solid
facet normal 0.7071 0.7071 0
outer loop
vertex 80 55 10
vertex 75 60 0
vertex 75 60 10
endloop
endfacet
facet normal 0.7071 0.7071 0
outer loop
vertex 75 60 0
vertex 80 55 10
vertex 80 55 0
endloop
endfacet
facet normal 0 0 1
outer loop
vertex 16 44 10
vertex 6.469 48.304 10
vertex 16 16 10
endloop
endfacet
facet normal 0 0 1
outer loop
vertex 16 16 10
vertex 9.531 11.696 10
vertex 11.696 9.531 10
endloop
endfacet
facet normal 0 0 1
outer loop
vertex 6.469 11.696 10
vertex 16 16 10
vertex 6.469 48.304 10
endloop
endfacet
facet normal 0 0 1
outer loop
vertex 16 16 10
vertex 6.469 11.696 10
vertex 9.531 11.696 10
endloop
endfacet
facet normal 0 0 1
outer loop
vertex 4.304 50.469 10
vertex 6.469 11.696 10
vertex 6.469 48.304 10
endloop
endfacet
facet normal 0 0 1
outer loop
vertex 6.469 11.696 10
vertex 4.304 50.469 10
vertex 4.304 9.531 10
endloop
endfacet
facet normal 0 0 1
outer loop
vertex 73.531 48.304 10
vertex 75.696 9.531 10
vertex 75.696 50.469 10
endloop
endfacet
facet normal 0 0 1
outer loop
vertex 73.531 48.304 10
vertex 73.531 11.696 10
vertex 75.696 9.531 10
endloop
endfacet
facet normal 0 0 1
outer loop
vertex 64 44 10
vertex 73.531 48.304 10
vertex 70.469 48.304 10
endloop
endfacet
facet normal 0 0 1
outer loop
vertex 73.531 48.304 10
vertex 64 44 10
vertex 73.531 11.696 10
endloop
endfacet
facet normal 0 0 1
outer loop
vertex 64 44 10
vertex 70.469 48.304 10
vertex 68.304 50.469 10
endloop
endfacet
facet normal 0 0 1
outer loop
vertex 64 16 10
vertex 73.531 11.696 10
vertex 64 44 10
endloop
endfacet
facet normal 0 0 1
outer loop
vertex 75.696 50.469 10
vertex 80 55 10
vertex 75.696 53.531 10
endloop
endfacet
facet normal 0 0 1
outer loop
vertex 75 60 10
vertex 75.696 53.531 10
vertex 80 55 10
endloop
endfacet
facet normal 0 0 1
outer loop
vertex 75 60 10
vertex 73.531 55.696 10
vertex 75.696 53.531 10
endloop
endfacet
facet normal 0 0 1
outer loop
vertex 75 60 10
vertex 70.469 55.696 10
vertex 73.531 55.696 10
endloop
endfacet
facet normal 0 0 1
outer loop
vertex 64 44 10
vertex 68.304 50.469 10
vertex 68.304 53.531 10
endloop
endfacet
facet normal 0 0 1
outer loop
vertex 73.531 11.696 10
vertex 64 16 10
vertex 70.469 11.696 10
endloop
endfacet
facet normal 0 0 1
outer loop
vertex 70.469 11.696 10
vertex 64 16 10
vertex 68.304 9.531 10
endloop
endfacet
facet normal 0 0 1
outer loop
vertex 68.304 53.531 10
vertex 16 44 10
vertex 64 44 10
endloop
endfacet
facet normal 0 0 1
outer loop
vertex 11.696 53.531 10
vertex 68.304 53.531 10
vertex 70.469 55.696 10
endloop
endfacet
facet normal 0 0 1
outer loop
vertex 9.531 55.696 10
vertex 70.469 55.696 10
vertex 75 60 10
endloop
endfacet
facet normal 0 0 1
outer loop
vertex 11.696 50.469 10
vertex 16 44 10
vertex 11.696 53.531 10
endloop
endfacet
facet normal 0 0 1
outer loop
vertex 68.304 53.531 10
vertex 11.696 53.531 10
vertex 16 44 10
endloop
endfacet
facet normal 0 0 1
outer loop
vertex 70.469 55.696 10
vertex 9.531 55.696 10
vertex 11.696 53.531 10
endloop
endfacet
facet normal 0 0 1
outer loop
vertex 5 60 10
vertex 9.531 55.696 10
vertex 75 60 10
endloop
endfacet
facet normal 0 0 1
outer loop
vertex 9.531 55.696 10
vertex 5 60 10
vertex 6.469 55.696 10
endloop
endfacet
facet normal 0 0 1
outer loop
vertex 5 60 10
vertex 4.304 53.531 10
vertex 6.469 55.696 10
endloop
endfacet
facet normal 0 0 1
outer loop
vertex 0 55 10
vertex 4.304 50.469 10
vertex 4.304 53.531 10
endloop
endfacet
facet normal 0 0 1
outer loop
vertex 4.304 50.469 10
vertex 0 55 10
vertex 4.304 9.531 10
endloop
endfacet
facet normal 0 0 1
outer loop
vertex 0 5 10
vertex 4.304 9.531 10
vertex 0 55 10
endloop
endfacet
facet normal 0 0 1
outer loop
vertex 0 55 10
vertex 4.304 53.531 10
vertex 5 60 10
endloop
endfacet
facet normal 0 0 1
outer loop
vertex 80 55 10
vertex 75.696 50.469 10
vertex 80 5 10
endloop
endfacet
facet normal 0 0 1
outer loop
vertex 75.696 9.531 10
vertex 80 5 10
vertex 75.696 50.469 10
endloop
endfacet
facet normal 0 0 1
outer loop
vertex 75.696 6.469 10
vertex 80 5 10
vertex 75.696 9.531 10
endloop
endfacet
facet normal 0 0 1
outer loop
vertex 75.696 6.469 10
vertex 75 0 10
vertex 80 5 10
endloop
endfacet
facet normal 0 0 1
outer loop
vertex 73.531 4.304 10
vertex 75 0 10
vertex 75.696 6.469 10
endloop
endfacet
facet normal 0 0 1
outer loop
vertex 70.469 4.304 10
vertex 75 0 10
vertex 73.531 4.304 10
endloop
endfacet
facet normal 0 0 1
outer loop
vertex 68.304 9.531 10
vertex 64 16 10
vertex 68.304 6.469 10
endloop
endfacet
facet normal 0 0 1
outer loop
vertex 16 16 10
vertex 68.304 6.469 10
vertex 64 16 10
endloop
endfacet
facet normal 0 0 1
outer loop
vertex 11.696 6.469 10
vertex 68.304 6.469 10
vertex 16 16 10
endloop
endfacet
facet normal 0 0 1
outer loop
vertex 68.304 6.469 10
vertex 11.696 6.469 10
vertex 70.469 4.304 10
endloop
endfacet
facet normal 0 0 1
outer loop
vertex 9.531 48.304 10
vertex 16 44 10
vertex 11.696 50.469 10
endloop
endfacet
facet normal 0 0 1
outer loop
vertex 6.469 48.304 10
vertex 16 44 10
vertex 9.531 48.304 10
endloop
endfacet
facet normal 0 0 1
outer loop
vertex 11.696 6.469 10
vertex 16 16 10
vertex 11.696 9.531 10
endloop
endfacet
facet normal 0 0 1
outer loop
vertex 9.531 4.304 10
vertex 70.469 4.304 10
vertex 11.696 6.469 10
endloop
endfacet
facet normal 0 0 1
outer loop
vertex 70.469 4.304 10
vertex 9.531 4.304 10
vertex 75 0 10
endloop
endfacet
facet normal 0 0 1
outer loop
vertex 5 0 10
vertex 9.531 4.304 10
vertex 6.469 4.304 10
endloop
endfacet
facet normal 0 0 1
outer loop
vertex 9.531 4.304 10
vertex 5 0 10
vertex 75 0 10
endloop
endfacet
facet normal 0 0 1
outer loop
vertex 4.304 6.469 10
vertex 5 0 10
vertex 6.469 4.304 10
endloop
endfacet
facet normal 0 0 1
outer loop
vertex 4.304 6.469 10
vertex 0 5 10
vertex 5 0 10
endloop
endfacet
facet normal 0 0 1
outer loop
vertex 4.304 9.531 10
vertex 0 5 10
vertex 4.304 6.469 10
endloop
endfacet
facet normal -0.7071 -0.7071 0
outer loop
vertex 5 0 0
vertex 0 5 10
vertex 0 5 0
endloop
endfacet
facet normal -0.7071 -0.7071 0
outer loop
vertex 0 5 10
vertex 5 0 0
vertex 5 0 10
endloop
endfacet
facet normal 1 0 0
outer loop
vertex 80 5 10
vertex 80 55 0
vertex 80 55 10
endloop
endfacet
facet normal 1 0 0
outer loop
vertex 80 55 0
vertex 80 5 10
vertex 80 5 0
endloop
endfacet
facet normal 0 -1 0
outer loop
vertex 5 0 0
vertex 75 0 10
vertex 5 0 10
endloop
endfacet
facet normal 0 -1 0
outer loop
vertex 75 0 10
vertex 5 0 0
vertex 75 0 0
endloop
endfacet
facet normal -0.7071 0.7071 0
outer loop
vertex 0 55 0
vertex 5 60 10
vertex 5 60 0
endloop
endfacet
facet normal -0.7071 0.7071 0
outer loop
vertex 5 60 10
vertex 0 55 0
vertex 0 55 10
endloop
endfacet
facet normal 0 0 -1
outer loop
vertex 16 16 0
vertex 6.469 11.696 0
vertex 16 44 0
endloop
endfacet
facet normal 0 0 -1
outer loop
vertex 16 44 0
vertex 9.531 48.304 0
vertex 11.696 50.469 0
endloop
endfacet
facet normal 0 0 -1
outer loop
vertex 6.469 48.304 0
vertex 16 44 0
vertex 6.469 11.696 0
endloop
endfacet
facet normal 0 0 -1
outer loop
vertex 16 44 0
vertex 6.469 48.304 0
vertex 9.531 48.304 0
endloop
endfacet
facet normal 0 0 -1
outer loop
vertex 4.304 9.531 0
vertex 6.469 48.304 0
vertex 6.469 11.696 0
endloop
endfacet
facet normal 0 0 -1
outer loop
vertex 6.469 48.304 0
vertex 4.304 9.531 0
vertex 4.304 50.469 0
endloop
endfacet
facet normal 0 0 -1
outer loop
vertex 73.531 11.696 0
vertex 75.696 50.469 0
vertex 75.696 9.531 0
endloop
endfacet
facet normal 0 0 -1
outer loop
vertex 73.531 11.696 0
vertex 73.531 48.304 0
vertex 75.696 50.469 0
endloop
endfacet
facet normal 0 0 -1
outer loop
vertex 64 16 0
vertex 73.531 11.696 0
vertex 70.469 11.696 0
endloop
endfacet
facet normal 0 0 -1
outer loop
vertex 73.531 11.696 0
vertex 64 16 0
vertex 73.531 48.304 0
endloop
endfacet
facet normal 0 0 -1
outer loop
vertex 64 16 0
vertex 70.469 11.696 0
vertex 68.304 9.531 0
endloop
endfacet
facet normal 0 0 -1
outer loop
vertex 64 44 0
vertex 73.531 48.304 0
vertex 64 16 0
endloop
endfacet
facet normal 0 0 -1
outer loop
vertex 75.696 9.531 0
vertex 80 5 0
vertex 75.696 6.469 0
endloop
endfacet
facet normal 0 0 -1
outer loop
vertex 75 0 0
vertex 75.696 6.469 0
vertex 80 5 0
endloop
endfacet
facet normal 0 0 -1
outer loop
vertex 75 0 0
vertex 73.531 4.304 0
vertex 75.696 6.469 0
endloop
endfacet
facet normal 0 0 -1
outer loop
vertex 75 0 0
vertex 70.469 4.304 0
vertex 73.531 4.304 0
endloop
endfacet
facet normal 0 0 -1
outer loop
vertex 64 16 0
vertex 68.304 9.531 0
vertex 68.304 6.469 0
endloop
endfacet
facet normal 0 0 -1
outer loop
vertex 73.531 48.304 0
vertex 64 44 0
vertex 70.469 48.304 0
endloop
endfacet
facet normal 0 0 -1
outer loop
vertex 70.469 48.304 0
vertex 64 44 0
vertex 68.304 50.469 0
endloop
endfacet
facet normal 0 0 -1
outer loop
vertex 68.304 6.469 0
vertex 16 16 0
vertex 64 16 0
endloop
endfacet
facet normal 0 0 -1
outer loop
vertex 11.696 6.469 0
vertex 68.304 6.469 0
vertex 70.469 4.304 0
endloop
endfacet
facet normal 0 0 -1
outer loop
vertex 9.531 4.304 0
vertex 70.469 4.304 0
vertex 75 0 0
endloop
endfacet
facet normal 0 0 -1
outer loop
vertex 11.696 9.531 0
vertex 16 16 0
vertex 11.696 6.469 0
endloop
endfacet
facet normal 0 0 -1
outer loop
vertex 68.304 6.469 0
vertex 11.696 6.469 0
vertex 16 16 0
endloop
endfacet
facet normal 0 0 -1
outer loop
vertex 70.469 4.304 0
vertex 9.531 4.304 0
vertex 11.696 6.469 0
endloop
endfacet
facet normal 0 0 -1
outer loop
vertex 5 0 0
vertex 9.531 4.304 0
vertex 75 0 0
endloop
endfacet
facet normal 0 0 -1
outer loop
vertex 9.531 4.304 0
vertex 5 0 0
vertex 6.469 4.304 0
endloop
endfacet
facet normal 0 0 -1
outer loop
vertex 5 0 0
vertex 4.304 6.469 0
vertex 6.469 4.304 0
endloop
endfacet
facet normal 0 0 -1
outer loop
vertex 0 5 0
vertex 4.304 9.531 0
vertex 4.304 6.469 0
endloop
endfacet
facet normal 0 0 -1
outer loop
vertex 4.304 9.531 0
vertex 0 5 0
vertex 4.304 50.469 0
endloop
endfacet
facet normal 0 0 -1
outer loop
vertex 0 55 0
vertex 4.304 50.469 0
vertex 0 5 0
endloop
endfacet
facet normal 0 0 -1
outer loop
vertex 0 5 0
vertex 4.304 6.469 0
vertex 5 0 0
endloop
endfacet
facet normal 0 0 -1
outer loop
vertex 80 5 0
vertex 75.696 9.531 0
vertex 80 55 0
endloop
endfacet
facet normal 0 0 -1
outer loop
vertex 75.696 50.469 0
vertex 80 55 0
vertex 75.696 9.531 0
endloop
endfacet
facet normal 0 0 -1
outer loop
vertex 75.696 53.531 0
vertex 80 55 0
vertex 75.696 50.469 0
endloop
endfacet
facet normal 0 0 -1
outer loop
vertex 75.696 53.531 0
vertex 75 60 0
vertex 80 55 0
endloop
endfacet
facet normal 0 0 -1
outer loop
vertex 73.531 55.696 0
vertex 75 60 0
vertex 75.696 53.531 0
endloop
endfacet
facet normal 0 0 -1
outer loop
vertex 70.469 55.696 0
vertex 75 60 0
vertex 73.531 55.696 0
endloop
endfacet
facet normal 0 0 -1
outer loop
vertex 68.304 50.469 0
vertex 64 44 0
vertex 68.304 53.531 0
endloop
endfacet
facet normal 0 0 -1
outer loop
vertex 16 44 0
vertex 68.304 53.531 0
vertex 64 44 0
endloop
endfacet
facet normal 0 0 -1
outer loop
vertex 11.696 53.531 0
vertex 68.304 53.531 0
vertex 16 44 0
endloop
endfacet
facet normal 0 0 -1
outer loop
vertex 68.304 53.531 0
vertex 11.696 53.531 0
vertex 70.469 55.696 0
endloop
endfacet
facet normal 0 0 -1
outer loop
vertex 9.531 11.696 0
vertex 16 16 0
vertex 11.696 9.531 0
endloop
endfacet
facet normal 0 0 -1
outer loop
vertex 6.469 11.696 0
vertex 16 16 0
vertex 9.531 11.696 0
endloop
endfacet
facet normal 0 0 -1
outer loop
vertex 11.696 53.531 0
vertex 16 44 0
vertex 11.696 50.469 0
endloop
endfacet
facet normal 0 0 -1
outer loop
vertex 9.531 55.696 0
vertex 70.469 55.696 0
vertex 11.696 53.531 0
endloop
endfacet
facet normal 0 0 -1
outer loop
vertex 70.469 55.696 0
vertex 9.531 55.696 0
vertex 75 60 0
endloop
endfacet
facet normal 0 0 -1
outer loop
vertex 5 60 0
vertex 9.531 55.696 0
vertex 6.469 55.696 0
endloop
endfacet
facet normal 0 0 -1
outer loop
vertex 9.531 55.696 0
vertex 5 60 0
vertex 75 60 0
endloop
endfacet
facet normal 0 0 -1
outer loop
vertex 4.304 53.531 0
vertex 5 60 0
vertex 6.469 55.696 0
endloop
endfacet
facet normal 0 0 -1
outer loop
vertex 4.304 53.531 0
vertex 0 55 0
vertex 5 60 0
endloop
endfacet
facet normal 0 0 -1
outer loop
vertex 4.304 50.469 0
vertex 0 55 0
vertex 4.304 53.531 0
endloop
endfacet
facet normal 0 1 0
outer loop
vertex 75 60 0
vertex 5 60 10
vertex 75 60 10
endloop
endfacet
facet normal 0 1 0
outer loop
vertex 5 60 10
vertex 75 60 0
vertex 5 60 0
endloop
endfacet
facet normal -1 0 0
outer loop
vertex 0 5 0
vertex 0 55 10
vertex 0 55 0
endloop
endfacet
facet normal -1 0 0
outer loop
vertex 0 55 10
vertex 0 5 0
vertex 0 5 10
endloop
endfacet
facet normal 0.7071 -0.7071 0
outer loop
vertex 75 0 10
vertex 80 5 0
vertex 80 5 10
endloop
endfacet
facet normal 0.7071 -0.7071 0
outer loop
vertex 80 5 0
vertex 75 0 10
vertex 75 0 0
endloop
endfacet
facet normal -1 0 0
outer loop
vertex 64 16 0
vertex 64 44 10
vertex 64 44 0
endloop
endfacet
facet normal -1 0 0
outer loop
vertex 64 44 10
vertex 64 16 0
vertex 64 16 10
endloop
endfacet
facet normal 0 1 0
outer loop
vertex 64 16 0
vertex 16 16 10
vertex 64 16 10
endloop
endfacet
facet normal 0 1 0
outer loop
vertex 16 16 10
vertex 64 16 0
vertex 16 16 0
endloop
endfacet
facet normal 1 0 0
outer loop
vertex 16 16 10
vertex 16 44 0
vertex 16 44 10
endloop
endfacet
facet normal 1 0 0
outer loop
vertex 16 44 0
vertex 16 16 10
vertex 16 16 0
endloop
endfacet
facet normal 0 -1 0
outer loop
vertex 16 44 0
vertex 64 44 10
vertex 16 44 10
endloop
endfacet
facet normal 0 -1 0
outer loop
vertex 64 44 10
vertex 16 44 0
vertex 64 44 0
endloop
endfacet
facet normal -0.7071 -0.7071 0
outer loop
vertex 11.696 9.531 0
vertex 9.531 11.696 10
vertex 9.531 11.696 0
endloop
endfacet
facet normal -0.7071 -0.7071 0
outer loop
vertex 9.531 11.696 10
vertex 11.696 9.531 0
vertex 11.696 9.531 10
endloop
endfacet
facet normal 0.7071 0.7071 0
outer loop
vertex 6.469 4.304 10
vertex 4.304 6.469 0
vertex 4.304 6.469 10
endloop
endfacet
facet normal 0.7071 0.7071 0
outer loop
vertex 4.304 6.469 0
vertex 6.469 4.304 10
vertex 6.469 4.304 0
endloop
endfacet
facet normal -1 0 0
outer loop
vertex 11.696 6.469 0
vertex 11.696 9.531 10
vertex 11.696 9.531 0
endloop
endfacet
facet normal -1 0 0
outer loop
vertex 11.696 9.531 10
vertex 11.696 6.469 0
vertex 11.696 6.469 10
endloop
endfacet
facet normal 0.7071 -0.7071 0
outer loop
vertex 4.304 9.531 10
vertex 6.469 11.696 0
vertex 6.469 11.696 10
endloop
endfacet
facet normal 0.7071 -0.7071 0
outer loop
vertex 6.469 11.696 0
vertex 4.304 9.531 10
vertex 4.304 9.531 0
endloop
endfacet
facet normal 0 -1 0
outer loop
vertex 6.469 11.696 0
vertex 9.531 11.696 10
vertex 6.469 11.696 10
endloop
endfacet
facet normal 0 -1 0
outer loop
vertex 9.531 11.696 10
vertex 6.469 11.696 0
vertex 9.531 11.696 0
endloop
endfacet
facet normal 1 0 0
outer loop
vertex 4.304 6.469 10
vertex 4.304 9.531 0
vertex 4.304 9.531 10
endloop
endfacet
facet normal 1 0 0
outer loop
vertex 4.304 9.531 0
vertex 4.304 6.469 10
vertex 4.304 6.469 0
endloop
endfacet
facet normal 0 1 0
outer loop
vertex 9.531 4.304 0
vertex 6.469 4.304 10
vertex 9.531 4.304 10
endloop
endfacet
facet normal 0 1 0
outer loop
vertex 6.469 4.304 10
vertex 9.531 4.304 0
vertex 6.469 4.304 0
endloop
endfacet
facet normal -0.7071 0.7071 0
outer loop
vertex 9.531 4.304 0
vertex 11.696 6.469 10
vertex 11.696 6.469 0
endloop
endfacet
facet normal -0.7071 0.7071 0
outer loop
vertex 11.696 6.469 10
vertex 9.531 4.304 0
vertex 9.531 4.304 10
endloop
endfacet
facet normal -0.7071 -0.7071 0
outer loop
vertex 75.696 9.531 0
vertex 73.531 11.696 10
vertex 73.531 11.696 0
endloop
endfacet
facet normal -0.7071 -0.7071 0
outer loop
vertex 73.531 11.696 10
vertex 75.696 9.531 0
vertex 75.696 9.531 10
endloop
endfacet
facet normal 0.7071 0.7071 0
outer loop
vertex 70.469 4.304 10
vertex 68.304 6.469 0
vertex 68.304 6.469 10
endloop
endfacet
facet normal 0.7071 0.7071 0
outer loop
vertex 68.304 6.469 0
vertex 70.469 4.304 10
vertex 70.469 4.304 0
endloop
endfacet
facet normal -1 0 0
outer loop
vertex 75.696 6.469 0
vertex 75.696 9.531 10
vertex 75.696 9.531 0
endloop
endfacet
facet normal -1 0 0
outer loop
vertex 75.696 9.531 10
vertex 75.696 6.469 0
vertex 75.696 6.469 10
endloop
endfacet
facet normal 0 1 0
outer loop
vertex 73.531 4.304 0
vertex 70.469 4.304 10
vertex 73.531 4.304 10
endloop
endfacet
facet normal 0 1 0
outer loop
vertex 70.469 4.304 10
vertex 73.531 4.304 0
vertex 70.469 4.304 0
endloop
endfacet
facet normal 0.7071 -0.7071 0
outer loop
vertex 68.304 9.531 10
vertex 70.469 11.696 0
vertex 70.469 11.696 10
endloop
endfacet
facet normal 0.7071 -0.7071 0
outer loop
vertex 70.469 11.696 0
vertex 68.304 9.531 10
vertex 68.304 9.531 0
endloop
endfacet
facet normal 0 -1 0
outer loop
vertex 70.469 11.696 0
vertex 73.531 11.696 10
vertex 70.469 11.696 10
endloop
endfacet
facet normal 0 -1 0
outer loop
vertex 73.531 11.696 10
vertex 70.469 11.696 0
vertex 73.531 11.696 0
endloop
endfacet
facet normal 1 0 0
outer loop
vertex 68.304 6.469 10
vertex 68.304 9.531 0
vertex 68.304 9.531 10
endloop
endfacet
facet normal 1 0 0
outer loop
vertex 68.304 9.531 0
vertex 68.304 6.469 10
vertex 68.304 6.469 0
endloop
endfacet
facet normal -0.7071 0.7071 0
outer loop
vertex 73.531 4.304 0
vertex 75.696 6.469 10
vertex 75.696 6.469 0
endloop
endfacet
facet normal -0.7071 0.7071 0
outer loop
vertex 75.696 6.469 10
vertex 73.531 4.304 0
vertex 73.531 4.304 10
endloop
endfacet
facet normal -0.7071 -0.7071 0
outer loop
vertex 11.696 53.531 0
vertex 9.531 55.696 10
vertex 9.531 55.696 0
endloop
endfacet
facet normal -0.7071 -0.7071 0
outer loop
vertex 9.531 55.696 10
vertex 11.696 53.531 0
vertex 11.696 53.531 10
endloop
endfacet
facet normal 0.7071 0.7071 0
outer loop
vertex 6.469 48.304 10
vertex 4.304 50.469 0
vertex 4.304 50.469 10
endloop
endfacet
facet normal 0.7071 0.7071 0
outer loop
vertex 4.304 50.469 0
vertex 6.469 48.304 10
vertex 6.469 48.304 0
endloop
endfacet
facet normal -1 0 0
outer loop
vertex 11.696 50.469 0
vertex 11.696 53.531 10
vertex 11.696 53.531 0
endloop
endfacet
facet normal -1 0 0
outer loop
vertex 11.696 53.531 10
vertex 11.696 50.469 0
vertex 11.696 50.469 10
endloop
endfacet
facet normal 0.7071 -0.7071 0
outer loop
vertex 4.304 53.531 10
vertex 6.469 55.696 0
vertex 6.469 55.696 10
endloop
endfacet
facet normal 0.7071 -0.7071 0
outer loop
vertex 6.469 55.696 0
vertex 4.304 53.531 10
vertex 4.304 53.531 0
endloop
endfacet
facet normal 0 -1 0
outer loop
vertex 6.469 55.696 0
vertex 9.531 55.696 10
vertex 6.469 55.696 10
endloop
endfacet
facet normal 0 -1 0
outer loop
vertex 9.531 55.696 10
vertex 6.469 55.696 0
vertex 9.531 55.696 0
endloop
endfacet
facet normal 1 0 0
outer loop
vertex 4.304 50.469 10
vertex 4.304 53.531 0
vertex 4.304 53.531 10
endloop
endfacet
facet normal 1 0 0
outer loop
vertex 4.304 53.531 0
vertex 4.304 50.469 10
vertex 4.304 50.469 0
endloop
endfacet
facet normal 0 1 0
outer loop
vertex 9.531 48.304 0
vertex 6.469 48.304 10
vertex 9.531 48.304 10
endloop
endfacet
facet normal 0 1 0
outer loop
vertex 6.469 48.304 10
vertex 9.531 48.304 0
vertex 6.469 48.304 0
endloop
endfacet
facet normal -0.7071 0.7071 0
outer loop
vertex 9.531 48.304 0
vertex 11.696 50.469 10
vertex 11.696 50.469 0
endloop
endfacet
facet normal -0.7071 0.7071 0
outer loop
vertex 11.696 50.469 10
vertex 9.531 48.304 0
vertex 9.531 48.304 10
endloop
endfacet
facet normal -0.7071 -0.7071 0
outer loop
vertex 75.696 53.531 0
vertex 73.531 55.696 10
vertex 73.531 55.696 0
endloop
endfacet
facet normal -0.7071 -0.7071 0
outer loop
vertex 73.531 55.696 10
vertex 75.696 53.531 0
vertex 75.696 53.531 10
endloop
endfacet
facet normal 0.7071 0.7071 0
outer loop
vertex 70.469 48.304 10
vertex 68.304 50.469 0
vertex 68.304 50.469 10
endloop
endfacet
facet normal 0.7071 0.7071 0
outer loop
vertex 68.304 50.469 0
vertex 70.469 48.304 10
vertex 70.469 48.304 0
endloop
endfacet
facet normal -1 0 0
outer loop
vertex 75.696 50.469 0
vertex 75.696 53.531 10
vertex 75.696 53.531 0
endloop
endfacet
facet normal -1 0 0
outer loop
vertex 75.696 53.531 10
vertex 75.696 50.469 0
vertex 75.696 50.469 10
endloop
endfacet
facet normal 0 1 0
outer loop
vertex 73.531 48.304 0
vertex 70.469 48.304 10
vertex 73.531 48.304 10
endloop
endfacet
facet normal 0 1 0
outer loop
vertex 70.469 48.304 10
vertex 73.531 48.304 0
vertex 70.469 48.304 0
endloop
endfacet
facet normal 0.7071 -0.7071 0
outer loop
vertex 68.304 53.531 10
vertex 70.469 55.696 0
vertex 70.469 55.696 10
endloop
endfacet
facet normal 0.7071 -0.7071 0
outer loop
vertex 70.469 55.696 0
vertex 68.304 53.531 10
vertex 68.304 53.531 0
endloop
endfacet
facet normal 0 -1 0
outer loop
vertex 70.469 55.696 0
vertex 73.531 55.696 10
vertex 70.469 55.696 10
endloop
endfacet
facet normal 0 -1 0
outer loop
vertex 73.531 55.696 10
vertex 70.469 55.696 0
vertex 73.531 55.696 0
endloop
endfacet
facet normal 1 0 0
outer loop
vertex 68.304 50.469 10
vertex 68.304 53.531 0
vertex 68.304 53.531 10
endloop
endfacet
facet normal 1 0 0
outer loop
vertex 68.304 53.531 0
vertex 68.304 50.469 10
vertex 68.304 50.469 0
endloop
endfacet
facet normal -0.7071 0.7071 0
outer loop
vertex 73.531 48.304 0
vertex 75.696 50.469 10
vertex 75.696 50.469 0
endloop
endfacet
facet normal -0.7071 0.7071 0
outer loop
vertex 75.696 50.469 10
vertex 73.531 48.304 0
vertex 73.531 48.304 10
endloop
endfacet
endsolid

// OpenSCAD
$fn = 32;

// ----------------------------------------------------------------------
// Frame plate: 80 x 60 frame, 16 mm rails
// ----------------------------------------------------------------------

// --- parameters (mm) ---
plate_l = 80;             // plate length, X
plate_w = 60;             // plate width, Y
plate_t = 10;             // plate thickness, Z (extrusion height)
corner_c = 5;             // corner chamfer
frame_bar = 16;           // frame rail width
bolt_r = 4;               // corner bolt window radius
bolt_inset = 8;           // bolt centre inset from the edges
fit_tol = 0.02;           // declared fit tolerance (prompt contract)
free_tol = 0.2;           // declared free tolerance (prompt contract)

win_l = plate_l - 2 * frame_bar;  // window length
win_w = plate_w - 2 * frame_bar;  // window width
bolt_d = 2 * bolt_r;  // corner hole diameter

profile = [[5, 0], [75, 0], [80, 5], [80, 55], [75, 60], [5, 60], [0, 55], [0, 5]];  // primary outline, 8 points, counter clockwise
void_1 = [[16, 16], [64, 16], [64, 44], [16, 44]];  // the window, 4 points
void_2 = [[11.696, 9.531], [9.531, 11.696], [6.469, 11.696], [4.304, 9.531], [4.304, 6.469], [6.469, 4.304], [9.531, 4.304], [11.696, 6.469]];  // corner bolt window, 8 points
void_3 = [[75.696, 9.531], [73.531, 11.696], [70.469, 11.696], [68.304, 9.531], [68.304, 6.469], [70.469, 4.304], [73.531, 4.304], [75.696, 6.469]];  // corner bolt window, 8 points
void_4 = [[11.696, 53.531], [9.531, 55.696], [6.469, 55.696], [4.304, 53.531], [4.304, 50.469], [6.469, 48.304], [9.531, 48.304], [11.696, 50.469]];  // corner bolt window, 8 points
void_5 = [[75.696, 53.531], [73.531, 55.696], [70.469, 55.696], [68.304, 53.531], [68.304, 50.469], [70.469, 48.304], [73.531, 48.304], [75.696, 50.469]];  // corner bolt window, 8 points

// --- the one profile operation ---
difference() {
  linear_extrude(height = plate_t) polygon(points = profile);
  translate([0, 0, -1])
    linear_extrude(height = plate_t + 2) polygon(points = void_1);
  translate([0, 0, -1])
    linear_extrude(height = plate_t + 2) polygon(points = void_2);
  translate([0, 0, -1])
    linear_extrude(height = plate_t + 2) polygon(points = void_3);
  translate([0, 0, -1])
    linear_extrude(height = plate_t + 2) polygon(points = void_4);
  translate([0, 0, -1])
    linear_extrude(height = plate_t + 2) polygon(points = void_5);
}
